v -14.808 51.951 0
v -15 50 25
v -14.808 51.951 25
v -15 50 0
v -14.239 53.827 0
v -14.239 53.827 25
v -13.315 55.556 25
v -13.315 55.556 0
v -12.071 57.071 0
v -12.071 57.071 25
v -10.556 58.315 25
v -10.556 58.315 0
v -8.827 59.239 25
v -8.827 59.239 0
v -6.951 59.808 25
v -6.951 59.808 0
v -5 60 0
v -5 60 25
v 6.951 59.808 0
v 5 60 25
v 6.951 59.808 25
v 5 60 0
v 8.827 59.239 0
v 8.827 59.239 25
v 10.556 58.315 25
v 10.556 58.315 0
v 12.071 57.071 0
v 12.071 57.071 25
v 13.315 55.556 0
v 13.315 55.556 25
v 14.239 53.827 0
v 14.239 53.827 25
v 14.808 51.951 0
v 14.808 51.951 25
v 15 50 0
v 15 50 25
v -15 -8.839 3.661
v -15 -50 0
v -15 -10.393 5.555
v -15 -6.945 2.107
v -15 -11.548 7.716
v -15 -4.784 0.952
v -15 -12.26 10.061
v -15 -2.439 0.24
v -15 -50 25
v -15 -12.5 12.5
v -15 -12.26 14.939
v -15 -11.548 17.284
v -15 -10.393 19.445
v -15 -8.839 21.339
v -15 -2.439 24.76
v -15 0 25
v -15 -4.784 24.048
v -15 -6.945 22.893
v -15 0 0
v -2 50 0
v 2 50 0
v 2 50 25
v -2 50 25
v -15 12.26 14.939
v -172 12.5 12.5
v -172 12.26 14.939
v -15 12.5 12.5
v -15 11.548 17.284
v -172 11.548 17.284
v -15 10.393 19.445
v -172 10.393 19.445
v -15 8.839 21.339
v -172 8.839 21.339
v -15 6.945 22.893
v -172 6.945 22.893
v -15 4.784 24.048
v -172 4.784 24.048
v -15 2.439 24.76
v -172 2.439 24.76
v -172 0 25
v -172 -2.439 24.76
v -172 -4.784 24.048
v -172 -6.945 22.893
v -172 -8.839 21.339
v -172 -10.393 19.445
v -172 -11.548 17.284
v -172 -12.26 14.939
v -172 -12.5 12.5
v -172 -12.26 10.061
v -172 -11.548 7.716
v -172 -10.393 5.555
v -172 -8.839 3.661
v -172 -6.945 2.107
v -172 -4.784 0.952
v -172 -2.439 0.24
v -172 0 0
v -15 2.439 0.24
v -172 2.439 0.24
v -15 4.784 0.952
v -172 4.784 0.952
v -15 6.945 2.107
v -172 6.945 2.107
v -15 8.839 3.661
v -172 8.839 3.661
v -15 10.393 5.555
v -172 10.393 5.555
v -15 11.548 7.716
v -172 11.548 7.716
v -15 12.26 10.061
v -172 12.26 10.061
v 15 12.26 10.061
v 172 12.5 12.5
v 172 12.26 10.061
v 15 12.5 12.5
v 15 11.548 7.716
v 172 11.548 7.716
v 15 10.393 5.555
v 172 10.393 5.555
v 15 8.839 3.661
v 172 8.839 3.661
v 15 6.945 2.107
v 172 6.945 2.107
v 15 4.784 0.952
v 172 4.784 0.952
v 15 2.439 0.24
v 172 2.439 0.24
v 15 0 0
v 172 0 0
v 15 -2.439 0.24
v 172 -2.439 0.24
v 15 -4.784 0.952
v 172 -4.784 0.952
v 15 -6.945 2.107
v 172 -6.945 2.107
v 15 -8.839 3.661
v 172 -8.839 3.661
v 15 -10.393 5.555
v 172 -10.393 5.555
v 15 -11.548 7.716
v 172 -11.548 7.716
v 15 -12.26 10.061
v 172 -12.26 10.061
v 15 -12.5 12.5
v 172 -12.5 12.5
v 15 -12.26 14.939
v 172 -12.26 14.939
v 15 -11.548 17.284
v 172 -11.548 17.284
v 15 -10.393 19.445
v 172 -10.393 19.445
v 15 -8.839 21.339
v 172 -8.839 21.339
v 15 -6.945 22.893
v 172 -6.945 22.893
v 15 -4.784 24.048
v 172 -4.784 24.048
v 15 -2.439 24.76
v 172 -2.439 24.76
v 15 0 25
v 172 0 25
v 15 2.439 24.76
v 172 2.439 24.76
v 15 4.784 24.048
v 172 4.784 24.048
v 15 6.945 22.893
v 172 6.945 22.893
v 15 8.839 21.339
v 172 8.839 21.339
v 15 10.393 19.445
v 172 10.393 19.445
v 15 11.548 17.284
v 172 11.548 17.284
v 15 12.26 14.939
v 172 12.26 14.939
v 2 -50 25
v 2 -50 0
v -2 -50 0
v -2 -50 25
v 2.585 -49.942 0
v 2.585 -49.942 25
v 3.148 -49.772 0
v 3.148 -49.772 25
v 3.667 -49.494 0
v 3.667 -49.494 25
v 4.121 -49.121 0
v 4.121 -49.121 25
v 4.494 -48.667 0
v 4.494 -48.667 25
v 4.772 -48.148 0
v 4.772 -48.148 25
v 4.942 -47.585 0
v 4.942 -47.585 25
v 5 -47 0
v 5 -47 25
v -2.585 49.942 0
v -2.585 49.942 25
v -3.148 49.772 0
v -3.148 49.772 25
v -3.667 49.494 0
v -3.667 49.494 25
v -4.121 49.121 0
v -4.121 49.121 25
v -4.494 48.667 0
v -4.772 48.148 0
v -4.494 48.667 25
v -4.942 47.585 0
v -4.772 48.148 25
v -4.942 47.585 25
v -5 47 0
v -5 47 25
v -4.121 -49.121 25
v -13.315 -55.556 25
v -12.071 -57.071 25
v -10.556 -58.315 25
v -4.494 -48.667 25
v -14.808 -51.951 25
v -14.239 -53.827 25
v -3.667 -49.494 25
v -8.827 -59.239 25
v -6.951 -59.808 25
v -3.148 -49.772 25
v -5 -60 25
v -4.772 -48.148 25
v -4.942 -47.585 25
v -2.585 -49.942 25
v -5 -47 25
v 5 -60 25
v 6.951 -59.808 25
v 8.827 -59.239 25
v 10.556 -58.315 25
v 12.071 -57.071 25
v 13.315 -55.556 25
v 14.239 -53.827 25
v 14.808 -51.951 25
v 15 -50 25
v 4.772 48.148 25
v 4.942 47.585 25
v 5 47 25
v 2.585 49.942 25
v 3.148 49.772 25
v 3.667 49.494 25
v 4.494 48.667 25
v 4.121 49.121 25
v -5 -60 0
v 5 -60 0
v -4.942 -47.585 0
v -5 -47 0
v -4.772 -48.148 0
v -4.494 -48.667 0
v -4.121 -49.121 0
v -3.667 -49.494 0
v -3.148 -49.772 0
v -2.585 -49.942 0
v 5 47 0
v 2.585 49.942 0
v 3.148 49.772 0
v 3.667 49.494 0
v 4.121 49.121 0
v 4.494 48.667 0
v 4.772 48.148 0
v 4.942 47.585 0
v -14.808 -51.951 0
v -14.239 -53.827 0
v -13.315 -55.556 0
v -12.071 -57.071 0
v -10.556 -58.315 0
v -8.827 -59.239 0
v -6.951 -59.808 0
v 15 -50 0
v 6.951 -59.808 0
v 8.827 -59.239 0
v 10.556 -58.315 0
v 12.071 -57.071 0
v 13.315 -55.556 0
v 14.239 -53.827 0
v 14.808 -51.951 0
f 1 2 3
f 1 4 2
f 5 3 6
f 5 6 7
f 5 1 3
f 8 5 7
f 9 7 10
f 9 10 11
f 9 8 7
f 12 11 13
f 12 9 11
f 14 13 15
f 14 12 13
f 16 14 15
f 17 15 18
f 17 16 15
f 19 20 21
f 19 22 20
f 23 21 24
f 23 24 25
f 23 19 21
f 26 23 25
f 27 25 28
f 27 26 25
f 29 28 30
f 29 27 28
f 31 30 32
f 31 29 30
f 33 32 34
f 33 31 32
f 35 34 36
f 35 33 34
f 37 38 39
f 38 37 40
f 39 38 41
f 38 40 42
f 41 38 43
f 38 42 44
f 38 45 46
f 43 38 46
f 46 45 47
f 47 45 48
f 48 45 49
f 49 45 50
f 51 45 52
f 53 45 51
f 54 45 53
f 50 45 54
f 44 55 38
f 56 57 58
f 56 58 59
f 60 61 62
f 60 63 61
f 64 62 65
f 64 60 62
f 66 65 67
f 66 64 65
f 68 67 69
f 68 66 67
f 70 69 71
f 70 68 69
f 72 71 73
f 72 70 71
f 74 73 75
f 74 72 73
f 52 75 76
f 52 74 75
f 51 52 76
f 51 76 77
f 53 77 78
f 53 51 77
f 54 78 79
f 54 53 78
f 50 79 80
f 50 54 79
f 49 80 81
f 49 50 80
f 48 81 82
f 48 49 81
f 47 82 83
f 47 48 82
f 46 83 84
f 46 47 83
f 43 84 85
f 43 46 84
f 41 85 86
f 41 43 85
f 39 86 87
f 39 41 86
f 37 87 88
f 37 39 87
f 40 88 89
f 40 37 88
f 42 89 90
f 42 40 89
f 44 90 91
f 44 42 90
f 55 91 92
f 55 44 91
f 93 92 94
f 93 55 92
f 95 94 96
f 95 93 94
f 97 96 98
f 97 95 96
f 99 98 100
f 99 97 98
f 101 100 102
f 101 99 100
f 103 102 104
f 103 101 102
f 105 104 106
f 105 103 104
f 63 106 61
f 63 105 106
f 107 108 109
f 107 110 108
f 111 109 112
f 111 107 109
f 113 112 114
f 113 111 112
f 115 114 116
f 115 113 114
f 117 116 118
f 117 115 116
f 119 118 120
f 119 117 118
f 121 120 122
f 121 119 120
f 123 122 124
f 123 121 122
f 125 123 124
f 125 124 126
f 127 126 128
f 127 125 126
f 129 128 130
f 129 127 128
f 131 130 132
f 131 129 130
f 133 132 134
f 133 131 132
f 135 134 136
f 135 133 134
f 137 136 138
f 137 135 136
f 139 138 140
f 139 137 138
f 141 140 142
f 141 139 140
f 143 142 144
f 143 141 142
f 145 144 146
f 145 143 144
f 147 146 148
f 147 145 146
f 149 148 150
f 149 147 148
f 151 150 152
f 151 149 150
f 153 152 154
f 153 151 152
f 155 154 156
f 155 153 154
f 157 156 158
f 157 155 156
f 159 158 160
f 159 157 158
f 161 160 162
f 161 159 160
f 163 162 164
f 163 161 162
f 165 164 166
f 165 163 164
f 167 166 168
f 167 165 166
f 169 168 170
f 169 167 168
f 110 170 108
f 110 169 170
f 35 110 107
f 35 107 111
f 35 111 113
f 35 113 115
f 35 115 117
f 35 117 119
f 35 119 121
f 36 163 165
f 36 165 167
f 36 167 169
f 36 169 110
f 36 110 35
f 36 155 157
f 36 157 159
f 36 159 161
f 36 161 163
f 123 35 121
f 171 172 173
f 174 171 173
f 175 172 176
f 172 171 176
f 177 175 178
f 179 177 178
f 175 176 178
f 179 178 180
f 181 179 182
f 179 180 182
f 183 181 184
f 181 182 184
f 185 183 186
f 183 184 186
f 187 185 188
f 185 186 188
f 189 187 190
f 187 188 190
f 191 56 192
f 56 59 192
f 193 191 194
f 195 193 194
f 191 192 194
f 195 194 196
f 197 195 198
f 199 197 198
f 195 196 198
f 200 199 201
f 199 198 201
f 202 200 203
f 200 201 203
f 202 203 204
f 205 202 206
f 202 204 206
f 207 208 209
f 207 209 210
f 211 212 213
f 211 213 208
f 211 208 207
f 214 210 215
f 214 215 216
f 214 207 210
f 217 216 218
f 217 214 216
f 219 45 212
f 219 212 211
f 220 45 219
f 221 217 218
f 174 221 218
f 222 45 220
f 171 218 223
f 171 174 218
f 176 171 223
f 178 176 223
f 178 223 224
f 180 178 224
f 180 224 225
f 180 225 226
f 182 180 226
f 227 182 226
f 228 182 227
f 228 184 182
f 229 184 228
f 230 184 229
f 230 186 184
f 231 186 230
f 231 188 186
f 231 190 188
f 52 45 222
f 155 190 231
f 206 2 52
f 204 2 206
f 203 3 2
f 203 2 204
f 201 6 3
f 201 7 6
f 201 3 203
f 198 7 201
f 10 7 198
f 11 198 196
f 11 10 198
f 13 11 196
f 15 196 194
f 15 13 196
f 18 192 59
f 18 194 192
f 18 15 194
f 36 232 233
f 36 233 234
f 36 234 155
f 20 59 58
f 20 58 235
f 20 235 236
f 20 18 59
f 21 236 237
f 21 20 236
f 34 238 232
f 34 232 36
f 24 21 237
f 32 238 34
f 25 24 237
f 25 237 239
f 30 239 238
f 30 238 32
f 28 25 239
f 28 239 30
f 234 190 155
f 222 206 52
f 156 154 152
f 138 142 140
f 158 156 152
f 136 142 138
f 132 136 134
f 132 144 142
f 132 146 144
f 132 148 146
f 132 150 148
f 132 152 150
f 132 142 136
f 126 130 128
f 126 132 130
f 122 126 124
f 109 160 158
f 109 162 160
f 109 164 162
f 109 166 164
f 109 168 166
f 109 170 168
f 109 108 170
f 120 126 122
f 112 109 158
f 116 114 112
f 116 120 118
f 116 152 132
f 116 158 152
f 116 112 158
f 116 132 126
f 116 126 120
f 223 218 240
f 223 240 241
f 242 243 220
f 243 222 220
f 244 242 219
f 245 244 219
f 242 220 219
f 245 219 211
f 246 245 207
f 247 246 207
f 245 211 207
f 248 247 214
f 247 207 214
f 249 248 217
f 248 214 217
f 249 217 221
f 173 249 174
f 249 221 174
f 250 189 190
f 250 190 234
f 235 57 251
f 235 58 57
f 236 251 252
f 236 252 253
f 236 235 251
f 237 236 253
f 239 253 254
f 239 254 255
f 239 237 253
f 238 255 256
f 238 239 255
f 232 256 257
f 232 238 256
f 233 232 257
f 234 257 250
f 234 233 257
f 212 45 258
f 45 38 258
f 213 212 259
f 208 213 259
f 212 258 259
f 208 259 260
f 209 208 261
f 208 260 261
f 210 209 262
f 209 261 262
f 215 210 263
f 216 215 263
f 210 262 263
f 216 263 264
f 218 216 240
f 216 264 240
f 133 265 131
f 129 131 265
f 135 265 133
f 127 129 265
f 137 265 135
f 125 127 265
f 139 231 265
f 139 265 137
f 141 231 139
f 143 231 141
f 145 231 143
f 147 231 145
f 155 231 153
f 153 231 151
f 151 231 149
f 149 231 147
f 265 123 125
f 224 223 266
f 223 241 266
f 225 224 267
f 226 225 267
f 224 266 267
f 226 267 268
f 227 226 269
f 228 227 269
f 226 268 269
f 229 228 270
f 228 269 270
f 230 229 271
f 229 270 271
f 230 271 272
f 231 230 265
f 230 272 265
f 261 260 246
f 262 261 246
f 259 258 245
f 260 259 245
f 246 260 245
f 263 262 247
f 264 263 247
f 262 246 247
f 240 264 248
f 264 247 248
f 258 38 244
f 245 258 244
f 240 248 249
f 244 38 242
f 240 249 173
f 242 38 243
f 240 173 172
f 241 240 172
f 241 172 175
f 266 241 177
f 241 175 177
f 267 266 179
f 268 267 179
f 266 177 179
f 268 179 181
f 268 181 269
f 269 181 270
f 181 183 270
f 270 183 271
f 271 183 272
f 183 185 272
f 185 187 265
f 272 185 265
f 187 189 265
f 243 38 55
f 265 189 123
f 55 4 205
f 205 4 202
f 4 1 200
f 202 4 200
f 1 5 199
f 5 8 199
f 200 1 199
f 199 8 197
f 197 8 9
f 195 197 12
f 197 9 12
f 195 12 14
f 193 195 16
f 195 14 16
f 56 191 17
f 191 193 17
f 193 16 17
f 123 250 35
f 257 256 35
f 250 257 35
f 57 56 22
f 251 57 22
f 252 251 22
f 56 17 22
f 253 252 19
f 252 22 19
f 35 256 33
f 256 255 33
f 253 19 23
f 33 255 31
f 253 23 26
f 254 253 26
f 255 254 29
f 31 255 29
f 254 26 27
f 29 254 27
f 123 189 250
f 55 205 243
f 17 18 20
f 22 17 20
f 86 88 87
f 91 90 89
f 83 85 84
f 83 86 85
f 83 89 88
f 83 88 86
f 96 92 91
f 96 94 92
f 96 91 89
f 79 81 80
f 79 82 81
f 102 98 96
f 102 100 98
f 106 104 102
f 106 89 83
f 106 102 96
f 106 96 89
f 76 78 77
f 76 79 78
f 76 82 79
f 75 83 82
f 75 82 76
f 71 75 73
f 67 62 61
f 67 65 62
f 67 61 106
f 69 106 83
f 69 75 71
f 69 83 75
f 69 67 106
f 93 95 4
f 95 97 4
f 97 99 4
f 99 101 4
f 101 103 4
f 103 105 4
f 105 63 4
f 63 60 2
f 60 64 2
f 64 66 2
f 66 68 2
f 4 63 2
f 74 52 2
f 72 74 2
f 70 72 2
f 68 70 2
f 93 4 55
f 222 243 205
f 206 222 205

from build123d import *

# Parameters (mm, degrees)
SKETCH1_W           = 30
SKETCH1_H           = 120
BOSS_EXTRUDE1_DEPTH = 25
SKETCH2_W           = 10
SKETCH2_H           = 100
CUT_EXTRUDE1_DEPTH  = 26
SKETCH3_W           = 160
SKETCH3_H           = 12.5
SKETCH4_W           = 160
SKETCH4_H           = 12.5
FILLET1_R           = 3
FILLET2_R           = 10
SKETCH5_R           = 12.5
CUT_EXTRUDE2_DEPTH  = 3
SKETCH6_R           = 12.5
CUT_EXTRUDE3_DEPTH  = 3


with BuildPart() as part:
    # Sketch1 → Boss-Extrude1 (new body)
    with BuildSketch(Plane.XY.offset(25)):
        Rectangle(SKETCH1_W, SKETCH1_H)
    extrude(amount=-BOSS_EXTRUDE1_DEPTH)

    # Sketch2 → Cut-Extrude1 (cut, through all)
    with BuildSketch(Plane(origin=(0, 0, 0), x_dir=(-1, 0, 0), z_dir=(0, 0, -1))):
        Rectangle(SKETCH2_W, SKETCH2_H)
    extrude(amount=-CUT_EXTRUDE1_DEPTH, mode=Mode.SUBTRACT)

    # Sketch3 → Revolve1 (revolve)
    with BuildSketch(Plane.XY.offset(12.5)):
        with Locations((-95, 6.25)):
            Rectangle(SKETCH3_W, SKETCH3_H)
    revolve(axis=Axis((-175, 0, 12.5), (1, 0, 0)))

    # Sketch4 → Revolve2 (revolve)
    with BuildSketch(Plane(origin=(0, 0, 12.5), x_dir=(-1, 0, 0), z_dir=(0, 0, -1))):
        with Locations((-95, 6.25)):
            Rectangle(SKETCH4_W, SKETCH4_H)
    revolve(axis=Axis((175, 0, 12.5), (-1, 0, 0)))

    # Fillet1
    fillet1_edges = [part.edges().sort_by_distance(p)[0] for p in [
        (-5, -50, 12.5),
        (5, -50, 12.5),
        (5, 50, 12.5),
        (-5, 50, 12.5),
    ]]
    fillet(fillet1_edges, radius=FILLET1_R)

    # Fillet2
    fillet2_edges = [part.edges().sort_by_distance(p)[0] for p in [
        (-15, 60, 12.5),
        (15, 60, 12.5),
        (15, -60, 12.5),
        (-15, -60, 12.5),
    ]]
    fillet(fillet2_edges, radius=FILLET2_R)

    # Sketch5 → Cut-Extrude2 (cut)
    with BuildSketch(Plane(origin=(175, 0, 0), x_dir=(0, 0, -1), z_dir=(1, 0, 0))):
        with Locations((-12.5, 0)):
            Circle(SKETCH5_R)
    extrude(amount=-CUT_EXTRUDE2_DEPTH, mode=Mode.SUBTRACT)

    # Sketch6 → Cut-Extrude3 (cut)
    with BuildSketch(Plane.ZY.offset(175)):
        with Locations((12.5, 0)):
            Circle(SKETCH6_R)
    extrude(amount=-CUT_EXTRUDE3_DEPTH, mode=Mode.SUBTRACT)


solid = part.part
